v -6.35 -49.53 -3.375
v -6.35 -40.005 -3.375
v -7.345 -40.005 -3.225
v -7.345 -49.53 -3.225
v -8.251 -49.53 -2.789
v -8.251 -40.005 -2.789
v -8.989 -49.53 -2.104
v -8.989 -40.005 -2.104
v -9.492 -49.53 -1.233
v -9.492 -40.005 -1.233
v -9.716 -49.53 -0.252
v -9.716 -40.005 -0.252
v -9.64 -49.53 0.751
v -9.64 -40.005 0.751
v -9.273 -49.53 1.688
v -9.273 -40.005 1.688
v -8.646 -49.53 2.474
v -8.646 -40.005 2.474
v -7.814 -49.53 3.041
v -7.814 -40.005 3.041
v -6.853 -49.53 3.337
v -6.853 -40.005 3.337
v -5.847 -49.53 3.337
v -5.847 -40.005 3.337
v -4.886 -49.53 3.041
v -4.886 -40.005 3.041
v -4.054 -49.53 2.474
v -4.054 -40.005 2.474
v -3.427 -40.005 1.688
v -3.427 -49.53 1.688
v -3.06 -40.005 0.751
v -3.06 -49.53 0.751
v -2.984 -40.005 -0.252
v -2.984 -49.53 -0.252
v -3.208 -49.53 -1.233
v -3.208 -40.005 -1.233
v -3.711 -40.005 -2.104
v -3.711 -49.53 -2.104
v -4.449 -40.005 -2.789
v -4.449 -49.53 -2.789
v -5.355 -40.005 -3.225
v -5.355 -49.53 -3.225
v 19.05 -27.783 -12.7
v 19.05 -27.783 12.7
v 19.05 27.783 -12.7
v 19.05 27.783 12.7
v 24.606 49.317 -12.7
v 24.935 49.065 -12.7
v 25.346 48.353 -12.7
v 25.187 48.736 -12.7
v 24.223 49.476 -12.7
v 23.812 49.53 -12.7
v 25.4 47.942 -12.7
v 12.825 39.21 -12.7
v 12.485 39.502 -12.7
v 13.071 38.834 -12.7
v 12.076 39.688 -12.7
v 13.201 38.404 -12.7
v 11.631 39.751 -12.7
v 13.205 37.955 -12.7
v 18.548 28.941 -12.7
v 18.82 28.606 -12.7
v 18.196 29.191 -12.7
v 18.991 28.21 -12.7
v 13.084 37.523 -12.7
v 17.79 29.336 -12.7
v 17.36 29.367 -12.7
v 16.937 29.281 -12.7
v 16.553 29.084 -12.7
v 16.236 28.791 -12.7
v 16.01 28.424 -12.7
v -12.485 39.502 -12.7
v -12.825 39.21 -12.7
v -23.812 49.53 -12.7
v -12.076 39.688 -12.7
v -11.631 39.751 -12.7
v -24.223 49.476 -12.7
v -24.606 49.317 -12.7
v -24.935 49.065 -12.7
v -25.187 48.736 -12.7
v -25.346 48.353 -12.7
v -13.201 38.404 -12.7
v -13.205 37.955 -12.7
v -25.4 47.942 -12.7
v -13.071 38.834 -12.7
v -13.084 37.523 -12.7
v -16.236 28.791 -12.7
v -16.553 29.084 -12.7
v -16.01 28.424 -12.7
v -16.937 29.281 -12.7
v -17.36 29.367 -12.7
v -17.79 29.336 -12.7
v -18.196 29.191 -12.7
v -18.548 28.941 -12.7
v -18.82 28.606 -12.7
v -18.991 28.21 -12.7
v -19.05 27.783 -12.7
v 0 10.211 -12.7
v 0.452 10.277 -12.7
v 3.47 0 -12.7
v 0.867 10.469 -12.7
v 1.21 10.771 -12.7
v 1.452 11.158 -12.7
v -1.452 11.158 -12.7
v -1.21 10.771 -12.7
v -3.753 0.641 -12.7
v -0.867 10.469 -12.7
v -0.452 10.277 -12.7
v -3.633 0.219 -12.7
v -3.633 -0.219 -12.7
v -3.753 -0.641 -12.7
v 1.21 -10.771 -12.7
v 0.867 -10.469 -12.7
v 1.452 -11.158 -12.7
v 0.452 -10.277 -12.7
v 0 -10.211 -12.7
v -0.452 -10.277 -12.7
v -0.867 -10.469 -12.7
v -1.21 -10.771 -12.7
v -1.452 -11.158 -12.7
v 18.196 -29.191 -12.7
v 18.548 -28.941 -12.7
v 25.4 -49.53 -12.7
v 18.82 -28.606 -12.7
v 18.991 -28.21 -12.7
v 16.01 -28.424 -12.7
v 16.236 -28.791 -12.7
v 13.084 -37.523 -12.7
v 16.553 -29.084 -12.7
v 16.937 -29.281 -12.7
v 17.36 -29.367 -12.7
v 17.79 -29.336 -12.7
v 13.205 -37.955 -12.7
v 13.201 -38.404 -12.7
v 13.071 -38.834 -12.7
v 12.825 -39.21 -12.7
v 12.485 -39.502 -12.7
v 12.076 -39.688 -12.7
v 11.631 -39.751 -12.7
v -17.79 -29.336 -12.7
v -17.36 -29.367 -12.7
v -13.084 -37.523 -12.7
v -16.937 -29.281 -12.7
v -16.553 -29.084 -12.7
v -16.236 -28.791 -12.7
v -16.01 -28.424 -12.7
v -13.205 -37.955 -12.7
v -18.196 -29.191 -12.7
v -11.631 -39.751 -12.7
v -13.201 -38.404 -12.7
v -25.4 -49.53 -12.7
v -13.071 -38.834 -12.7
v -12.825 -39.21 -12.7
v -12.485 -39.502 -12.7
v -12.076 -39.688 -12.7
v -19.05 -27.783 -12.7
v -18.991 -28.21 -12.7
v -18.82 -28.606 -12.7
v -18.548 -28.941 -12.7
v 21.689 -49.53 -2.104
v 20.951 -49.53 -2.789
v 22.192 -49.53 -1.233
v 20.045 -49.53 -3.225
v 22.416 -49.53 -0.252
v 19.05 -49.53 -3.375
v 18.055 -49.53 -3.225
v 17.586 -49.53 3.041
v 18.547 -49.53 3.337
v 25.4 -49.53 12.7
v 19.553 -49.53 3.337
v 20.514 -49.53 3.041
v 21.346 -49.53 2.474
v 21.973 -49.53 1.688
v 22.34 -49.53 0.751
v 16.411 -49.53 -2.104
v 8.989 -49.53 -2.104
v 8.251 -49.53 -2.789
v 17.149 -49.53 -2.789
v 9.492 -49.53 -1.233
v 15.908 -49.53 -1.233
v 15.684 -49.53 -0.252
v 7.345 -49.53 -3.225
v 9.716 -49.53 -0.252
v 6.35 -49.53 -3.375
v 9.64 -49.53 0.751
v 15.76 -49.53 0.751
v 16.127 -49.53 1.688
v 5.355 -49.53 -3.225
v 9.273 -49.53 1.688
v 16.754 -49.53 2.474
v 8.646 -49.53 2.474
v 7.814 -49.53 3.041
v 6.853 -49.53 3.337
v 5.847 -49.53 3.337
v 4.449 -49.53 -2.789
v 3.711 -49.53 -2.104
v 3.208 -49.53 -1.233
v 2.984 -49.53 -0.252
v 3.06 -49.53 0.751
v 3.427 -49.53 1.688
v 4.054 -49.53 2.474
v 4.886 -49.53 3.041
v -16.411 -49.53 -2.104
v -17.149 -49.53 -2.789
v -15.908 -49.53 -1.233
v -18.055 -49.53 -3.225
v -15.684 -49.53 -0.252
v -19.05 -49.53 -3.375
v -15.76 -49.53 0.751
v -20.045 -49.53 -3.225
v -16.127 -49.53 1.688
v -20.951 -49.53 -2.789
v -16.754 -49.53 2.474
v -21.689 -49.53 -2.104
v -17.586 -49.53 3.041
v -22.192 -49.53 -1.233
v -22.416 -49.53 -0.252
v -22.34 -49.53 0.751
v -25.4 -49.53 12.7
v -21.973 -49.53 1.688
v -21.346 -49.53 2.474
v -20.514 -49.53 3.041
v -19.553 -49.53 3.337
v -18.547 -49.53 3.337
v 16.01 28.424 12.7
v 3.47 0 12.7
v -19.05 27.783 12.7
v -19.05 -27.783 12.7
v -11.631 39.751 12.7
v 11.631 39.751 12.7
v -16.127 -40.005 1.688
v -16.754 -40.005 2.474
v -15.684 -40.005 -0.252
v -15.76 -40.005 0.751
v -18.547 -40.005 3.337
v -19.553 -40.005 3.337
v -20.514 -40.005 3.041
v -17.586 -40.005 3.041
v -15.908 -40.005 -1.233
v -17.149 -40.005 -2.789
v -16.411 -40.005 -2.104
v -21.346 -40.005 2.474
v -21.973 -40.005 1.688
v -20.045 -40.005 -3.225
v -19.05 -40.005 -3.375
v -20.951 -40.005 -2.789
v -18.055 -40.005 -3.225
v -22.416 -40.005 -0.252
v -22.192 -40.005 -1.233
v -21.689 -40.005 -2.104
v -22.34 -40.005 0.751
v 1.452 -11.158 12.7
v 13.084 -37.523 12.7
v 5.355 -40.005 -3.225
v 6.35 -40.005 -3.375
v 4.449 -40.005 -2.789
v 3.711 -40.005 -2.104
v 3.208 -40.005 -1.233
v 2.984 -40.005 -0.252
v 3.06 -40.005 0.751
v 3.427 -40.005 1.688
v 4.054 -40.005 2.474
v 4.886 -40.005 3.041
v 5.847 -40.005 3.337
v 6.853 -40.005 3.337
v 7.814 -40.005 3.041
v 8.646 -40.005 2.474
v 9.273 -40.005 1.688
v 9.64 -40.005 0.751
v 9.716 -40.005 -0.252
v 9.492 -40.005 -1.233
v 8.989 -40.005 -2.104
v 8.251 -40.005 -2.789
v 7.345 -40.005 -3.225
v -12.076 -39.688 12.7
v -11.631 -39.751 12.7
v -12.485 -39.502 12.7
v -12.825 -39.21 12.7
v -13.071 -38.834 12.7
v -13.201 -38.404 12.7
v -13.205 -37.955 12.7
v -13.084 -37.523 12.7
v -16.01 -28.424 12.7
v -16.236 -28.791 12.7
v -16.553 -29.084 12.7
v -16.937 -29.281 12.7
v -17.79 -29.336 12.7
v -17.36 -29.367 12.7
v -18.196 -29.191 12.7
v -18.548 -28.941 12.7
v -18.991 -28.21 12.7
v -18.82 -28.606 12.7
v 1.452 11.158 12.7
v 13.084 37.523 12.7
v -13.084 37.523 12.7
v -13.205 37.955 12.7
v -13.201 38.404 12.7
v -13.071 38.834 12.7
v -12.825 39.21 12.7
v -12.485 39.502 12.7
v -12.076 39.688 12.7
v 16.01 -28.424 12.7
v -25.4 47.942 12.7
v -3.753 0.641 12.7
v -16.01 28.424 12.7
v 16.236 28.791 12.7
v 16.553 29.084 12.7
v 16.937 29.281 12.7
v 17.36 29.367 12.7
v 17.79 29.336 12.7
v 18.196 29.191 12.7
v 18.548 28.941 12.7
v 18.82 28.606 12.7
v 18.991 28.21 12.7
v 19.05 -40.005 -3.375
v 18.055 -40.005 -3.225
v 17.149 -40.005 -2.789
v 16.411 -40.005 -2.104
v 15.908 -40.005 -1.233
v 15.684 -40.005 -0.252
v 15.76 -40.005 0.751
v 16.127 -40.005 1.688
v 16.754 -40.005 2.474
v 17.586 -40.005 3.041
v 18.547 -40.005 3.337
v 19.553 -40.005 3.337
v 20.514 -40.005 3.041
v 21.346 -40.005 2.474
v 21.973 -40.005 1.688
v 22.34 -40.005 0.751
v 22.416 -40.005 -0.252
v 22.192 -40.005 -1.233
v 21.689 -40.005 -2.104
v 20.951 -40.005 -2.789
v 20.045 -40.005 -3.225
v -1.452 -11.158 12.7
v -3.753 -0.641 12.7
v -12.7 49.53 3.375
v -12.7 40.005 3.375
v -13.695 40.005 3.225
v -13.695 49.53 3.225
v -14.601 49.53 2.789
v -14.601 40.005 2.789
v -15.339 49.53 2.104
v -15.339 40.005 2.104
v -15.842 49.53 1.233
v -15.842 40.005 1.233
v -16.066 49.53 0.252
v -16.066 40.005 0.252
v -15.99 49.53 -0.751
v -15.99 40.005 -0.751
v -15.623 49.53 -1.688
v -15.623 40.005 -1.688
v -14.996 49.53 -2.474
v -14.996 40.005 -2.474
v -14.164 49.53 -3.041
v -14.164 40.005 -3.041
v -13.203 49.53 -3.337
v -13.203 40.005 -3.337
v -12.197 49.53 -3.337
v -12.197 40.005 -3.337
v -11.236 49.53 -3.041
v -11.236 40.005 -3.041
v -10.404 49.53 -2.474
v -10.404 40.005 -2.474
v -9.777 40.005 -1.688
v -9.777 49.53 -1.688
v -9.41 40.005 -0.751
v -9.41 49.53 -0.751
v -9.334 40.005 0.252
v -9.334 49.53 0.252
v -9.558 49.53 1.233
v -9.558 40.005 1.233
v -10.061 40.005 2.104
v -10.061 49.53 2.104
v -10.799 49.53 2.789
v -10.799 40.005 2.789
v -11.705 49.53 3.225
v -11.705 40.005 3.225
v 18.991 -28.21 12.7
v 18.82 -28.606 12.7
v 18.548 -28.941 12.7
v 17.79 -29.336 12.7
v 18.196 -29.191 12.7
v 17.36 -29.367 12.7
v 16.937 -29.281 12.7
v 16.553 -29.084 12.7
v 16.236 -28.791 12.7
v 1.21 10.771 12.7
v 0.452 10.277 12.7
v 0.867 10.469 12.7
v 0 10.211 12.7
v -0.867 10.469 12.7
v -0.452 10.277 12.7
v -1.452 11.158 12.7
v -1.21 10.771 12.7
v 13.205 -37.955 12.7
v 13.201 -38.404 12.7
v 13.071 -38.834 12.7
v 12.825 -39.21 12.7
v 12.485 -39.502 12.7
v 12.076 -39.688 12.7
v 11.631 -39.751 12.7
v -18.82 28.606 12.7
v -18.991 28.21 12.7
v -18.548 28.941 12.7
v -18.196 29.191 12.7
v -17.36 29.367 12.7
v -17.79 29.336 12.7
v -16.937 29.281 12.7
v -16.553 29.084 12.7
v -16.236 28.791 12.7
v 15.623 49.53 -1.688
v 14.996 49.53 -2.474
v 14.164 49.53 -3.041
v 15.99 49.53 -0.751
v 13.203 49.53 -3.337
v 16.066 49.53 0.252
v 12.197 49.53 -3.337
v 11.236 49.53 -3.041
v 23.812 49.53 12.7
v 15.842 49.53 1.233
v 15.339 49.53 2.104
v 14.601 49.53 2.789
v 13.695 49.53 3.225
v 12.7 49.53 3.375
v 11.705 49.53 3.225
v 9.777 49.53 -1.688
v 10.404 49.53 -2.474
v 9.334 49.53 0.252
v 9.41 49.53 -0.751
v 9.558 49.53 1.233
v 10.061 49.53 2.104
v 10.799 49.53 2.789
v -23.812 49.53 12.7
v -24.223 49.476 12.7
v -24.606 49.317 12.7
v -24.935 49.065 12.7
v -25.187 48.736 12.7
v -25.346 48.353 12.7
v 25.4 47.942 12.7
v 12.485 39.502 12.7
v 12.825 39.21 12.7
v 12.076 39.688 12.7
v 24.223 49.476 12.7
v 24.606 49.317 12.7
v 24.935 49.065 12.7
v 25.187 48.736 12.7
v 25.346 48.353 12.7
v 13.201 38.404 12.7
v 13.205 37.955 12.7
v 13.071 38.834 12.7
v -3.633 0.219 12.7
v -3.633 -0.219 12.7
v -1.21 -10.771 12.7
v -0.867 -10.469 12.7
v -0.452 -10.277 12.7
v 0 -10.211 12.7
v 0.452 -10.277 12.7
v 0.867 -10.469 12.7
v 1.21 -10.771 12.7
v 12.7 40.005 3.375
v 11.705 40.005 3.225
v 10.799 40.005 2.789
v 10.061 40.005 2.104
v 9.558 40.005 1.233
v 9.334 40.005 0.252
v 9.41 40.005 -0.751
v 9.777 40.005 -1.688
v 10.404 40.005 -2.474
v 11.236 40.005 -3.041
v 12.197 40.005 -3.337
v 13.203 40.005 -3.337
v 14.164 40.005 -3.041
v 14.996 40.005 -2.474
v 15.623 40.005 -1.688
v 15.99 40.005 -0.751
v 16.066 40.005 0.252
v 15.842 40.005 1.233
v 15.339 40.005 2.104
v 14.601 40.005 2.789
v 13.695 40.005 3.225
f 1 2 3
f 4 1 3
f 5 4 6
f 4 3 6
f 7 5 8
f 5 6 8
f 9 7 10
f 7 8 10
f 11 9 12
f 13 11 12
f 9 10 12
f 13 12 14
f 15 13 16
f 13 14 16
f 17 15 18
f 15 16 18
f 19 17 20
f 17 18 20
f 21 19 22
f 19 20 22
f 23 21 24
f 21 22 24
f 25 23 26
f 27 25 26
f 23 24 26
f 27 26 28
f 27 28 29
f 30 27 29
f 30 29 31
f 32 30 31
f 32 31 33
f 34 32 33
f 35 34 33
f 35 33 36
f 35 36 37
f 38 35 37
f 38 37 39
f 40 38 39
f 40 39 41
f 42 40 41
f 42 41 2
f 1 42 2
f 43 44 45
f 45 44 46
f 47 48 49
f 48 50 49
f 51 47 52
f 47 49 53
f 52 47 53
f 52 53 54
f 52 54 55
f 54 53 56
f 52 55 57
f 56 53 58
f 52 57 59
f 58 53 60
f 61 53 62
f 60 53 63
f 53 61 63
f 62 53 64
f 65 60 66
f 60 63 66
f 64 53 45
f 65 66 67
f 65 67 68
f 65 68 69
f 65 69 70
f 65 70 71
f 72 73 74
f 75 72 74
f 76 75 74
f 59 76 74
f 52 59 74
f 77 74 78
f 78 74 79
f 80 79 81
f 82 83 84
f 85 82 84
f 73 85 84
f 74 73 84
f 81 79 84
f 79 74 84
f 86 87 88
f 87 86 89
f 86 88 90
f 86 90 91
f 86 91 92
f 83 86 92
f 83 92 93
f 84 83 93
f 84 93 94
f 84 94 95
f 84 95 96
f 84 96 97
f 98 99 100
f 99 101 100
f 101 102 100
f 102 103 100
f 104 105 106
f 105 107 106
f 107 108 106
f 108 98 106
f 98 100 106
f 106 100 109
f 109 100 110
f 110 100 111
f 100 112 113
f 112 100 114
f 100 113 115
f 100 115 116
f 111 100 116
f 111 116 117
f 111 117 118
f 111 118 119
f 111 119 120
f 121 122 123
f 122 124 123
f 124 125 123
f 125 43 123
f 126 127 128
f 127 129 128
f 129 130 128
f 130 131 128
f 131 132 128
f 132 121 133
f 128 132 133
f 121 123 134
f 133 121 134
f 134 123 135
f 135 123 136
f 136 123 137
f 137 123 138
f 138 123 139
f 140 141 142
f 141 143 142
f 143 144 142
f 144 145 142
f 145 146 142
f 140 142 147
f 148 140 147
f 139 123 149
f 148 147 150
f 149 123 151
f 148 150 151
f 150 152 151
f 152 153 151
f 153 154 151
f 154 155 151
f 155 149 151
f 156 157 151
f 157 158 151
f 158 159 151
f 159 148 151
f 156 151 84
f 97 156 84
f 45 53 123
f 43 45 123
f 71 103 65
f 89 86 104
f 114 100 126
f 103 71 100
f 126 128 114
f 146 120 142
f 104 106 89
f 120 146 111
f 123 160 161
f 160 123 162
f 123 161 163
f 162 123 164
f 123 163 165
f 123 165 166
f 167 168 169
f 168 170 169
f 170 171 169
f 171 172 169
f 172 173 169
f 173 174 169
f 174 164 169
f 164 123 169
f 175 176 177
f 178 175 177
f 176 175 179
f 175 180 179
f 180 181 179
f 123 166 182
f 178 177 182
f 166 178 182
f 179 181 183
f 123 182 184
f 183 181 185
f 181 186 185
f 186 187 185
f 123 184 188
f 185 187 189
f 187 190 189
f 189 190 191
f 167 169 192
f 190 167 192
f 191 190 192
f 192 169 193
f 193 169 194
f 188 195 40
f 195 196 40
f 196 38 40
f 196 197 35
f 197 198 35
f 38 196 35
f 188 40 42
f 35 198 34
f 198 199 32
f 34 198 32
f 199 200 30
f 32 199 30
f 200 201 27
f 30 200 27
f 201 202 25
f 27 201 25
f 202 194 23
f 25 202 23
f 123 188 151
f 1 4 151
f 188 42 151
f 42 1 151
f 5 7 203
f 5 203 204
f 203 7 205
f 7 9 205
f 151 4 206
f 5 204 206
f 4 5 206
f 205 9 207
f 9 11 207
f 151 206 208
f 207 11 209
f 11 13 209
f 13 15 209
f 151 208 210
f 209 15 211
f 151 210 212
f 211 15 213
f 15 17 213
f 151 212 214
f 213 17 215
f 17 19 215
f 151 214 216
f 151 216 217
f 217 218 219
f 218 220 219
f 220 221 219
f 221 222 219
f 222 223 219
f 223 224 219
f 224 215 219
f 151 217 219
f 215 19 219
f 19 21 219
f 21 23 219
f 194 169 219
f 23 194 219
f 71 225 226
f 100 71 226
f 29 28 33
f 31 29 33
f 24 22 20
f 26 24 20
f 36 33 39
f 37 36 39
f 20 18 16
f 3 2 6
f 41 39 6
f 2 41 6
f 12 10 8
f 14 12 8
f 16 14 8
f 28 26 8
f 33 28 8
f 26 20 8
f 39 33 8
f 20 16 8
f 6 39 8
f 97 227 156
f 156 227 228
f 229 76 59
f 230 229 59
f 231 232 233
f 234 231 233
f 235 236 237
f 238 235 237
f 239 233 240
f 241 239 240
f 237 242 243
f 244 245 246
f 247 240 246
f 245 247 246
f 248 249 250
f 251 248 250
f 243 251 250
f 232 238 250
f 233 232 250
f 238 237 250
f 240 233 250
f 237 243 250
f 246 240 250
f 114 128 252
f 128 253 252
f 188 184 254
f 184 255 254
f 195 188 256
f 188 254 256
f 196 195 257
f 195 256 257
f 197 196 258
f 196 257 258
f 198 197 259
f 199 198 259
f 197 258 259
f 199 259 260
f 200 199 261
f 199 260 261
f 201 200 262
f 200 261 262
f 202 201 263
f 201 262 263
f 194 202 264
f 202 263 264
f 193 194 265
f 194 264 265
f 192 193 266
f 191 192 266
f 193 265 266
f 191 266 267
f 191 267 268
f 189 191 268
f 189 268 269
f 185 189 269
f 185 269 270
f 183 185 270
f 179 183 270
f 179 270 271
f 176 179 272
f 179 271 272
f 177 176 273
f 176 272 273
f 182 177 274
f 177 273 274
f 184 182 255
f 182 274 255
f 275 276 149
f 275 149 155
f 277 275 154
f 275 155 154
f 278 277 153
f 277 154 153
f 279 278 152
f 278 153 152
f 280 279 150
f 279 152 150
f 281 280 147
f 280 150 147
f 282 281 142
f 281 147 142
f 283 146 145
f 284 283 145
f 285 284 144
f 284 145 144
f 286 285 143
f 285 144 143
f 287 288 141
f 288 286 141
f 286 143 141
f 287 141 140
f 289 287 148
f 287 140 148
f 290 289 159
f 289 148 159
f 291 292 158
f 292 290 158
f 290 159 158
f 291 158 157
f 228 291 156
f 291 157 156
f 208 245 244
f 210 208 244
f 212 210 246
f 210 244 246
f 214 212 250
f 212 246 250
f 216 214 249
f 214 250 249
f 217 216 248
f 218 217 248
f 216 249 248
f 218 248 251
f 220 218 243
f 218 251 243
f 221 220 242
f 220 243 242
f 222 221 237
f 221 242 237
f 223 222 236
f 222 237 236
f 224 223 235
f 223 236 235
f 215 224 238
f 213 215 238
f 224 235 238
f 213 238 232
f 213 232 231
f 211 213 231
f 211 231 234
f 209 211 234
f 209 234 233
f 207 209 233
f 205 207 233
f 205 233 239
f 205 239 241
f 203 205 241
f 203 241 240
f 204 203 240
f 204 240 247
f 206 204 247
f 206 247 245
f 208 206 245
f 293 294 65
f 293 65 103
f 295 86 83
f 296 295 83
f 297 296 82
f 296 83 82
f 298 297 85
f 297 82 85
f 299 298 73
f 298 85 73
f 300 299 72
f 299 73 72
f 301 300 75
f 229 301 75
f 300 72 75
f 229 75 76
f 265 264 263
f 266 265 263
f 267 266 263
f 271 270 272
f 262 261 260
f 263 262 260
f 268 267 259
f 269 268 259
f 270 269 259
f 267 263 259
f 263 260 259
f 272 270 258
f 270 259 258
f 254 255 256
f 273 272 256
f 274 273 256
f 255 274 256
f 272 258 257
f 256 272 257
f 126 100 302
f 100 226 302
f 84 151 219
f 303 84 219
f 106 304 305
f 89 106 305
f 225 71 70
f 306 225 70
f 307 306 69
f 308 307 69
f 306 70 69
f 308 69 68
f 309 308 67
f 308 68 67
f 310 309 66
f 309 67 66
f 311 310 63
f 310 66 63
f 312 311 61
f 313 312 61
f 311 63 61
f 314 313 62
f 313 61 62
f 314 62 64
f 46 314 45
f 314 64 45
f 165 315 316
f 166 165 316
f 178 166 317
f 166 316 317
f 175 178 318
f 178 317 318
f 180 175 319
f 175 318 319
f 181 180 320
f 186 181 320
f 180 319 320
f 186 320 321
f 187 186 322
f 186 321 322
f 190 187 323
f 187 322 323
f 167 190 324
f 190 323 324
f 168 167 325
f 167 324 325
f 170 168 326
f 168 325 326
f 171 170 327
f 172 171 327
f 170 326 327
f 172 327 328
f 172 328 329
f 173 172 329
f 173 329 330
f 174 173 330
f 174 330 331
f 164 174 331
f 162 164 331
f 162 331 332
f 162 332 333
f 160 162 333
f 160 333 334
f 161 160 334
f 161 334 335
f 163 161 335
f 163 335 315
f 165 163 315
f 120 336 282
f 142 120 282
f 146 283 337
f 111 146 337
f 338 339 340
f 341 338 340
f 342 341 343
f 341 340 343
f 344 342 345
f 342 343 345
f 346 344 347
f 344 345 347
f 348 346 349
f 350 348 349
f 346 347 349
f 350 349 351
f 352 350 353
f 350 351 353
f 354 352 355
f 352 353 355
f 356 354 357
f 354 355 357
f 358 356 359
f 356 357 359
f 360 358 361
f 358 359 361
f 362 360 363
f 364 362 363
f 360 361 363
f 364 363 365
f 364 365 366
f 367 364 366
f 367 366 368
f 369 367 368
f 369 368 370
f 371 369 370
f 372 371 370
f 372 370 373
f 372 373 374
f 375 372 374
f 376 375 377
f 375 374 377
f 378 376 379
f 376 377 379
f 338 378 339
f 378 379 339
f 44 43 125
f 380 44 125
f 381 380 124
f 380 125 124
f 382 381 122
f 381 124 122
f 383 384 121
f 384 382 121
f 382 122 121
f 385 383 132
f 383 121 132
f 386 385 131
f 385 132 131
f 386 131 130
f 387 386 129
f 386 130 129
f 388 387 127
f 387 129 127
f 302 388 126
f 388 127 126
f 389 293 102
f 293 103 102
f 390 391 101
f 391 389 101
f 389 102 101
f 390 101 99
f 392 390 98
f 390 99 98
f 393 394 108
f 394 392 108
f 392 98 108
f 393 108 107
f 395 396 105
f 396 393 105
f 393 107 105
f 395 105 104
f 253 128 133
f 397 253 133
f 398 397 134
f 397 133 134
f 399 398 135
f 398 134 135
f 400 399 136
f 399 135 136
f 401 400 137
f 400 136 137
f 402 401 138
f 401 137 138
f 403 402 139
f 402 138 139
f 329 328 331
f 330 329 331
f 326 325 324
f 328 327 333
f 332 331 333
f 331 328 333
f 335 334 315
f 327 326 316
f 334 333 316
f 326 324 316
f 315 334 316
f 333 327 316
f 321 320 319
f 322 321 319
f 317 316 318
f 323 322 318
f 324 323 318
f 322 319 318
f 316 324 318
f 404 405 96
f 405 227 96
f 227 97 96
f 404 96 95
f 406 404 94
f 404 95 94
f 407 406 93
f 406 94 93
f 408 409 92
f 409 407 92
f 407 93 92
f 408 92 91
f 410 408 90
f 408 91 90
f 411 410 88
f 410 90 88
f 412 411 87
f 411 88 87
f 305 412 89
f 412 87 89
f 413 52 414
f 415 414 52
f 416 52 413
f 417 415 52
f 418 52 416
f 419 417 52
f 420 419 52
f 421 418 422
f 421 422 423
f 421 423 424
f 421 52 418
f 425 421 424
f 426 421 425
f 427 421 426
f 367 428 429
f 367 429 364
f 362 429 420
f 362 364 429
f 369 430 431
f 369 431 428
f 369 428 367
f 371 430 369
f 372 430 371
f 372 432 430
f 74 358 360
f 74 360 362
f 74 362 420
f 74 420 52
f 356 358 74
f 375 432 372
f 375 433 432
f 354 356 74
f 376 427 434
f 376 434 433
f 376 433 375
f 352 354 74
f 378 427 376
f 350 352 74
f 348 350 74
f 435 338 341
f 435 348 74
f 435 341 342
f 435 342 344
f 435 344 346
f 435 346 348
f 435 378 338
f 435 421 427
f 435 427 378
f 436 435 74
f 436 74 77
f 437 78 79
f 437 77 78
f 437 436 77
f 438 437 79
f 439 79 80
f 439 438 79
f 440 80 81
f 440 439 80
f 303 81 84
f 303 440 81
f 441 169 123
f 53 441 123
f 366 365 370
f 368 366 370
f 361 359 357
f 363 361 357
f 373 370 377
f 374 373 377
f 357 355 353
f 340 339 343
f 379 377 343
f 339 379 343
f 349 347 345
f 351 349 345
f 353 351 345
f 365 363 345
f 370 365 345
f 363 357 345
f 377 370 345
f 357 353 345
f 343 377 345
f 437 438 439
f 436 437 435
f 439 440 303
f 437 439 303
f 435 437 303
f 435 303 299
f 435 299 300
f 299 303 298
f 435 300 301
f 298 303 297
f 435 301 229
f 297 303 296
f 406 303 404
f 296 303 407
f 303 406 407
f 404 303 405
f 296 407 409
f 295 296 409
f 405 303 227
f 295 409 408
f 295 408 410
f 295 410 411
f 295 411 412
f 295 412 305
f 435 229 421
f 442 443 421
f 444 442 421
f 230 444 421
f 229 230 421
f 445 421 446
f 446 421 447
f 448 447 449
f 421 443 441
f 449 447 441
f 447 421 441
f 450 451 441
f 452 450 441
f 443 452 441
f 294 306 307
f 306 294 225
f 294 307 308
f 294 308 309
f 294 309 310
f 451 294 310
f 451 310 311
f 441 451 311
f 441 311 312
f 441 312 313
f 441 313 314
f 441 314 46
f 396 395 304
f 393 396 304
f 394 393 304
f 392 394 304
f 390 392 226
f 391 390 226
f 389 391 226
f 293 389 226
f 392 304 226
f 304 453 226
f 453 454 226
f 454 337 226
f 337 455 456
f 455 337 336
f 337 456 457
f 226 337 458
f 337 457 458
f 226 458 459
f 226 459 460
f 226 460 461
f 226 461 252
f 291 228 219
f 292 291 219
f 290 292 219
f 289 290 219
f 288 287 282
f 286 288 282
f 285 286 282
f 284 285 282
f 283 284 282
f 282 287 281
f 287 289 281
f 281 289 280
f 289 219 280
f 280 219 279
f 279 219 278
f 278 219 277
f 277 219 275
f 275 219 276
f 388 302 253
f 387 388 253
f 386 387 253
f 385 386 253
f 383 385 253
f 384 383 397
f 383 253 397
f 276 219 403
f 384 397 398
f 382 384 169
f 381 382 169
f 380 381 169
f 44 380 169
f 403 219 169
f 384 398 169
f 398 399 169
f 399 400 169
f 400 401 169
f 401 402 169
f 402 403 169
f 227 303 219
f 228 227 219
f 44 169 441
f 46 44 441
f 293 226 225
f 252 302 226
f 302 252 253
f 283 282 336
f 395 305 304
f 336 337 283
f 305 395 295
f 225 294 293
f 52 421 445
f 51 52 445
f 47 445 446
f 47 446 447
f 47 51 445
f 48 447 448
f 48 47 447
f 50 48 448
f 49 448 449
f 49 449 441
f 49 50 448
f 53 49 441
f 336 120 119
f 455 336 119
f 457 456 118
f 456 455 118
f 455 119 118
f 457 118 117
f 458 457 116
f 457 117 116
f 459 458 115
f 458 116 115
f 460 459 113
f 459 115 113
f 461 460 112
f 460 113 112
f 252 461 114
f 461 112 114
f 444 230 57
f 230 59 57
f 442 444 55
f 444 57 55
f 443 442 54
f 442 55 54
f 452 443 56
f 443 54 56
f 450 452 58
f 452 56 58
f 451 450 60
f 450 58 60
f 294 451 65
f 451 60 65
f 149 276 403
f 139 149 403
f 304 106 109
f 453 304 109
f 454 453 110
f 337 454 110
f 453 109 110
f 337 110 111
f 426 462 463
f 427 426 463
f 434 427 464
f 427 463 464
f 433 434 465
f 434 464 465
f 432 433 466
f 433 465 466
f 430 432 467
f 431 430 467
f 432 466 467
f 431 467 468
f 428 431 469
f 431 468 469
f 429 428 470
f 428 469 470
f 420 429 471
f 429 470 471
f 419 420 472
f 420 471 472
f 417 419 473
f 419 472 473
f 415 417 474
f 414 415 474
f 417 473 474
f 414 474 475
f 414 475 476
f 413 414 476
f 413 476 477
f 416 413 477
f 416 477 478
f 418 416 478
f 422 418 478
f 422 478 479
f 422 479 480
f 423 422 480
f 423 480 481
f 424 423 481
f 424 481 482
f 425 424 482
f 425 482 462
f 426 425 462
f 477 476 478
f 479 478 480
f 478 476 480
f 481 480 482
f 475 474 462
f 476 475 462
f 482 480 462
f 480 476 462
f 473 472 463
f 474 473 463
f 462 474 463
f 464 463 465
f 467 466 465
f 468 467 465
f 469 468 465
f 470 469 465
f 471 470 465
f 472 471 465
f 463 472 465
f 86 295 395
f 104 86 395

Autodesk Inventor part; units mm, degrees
ref_plane "YZ Plane" through (0, 0, 0) normal (1, 0, 0) x (0, 1, 0)
ref_plane "XZ Plane" through (0, 0, 0) normal (0, 1, 0) x (-1, 0, 0)
ref_plane "XY Plane" through (0, 0, 0) normal (0, 0, 1) x (1, 0, 0)
sketch "Sketch1" plane through (0, 0, 0) normal (0, 1, 0) x (-1, 0, 0)
  line L0 (25.4, 12.7) -> (-25.4, 12.7)
  line L1 (-25.4, 12.7) -> (-25.4, -12.7)
  line L2 (-25.4, -12.7) -> (25.4, -12.7)
  line L3 (25.4, -12.7) -> (25.4, 12.7)
  line L4 (25.4, 12.7) -> (-25.4, -12.7) construction
  line L5 (-25.4, 12.7) -> (25.4, -12.7) construction
  point P0 (0, 0)
  dimension "d0" = 50.8
  dimension "d1" = 25.4
extrude "Extrusion1" add sketch "Sketch1" along normal mid plane 99.06
sketch "Sketch2" plane through (-25.4, 49.53, 12.7) normal (0, 0, 1) x (1, 0, 0)
  line L0 (50.8, -99.06) -> (0, -99.06) construction
  line L1 (0, -99.06) -> (0, 0) construction
  line L2 (0, 0) -> (50.8, 0) construction
  line L3 (50.8, 0) -> (50.8, -99.06) construction
  line L4 (44.45, -6.35) -> (6.35, -6.35) construction
  line L5 (6.35, -6.35) -> (6.35, -92.71) construction
  line L6 (6.35, -92.71) -> (44.45, -92.71) construction
  line L7 (44.45, -92.71) -> (44.45, -6.35) construction
  line L8 (6.35, -6.35) -> (44.45, -92.71) construction
  line L9 (6.35, -92.71) -> (44.45, -6.35) construction
  line L10 (6.35, -14.2159) -> (40.9797, -92.71) construction
  line L11 (44.45, -84.8441) -> (9.8203, -6.35) construction
  line L12 (40.9797, -6.35) -> (6.35, -84.8441) construction
  line L13 (9.8203, -92.71) -> (44.45, -14.2159) construction
  line L14 (0, -99.06) -> (0, 0) construction
  line L15 (0, -89.281) -> (50.8, -89.281) construction
  line L16 (50.8, -99.06) -> (50.8, 0) construction
  line L17 (25.4, -57.3959) -> (11.3331, -89.281)
  line L18 (11.3331, -89.281) -> (39.4669, -89.281)
  line L19 (39.4669, -89.281) -> (25.4, -57.3959)
  line L20 (28.8703, -49.53) -> (44.45, -84.8441)
  line L21 (44.45, -84.8441) -> (44.45, -14.2159)
  line L22 (44.45, -14.2159) -> (28.8703, -49.53)
  line L23 (9.8203, -6.35) -> (25.4, -41.6641)
  line L24 (9.8092, -6.35) -> (40.9797, -6.35) construction
  line L25 (40.9797, -6.35) -> (25.4, -41.6641)
  line L26 (6.35, -14.2159) -> (6.35, -84.8441)
  line L27 (6.35, -84.8441) -> (21.9297, -49.53)
  line L28 (21.9297, -49.53) -> (6.35, -14.2159)
  line L29 (0, -9.779) -> (50.8, -9.779) construction
  line L30 (11.3331, -9.779) -> (39.4669, -9.779)
  point P0 (25.4, -49.53)
  point P1 (9.8203, -6.35)
  dimension "d4" = 6.35
  dimension "d5" = 3.175
  dimension "d6" = 3.175
  dimension "d7" = 3.175
  dimension "d8" = 3.175
  dimension "d9" = 9.779
  dimension "d23" = 9.779
extrude "Extrusion2" cut sketch "Sketch2" against normal through all
fillet "Fillet1" radius 1.5875 13 edges at (-14.0669, -39.751, 0) (-19.05, -35.3141, 0) (14.0669, -39.751, 0) (19.05, -35.3141, 0) (0, 7.8659, 0) (-3.4703, 0, 0) (-19.05, 35.3141, 0) (19.05, 35.3141, 0) (0, -7.8659, 0) (25.4, 49.53, 0) (-25.4, 49.53, 0) (-14.0669, 39.751, 0) (14.0669, 39.751, 0)
sketch "Sketch3" plane through (0, -49.53, 0) normal (0, -1, 0) x (1, 0, 0)
  line L0 (-25.4, 12.7) -> (25.4, 12.7) construction
  line L1 (25.4, 12.7) -> (25.4, -12.7) construction
  line L2 (25.4, -12.7) -> (-25.4, -12.7) construction
  line L3 (-25.4, -12.7) -> (-25.4, 12.7) construction
  line L4 (-6.35, 0) -> (6.35, 0) construction
  point P0 (0, 0)
  point P1 (0, 0)
  point P2 (-19.05, 0)
  point P3 (19.05, 0)
  dimension "d12" = 12.7
  dimension "d13" = 12.7
  dimension "d14" = 12.7
hole "Hole1" at (-6.35, -49.53, 0) at (6.35, -49.53, 0) at (-19.05, -49.53, 0) at (19.05, -49.53, 0) direction (0, 1, 0) diameter 6.75 depth 9.525
sketch "Sketch4" plane through (0, 49.53, 0) normal (0, 1, 0) x (1, 0, 0)
  line L0 (-12.7, 0) -> (12.7, 0) construction
  point P0 (0, 0)
  point P1 (0, 0)
  dimension "d24" = 25.4
hole "Hole2" at (-12.7, 49.53, 0) at (12.7, 49.53, 0) direction (0, -1, 0) diameter 6.75 depth 9.525
equation "\"d6\" = d5"
equation "\"d7\" = d5"
equation "\"d8\" = d7"
equation "\"d23\" = d9"
equation "\"d13\" = d12"
equation "\"d14\" = d13"
properties part number "DB1-024" material "ABS Plastic"
